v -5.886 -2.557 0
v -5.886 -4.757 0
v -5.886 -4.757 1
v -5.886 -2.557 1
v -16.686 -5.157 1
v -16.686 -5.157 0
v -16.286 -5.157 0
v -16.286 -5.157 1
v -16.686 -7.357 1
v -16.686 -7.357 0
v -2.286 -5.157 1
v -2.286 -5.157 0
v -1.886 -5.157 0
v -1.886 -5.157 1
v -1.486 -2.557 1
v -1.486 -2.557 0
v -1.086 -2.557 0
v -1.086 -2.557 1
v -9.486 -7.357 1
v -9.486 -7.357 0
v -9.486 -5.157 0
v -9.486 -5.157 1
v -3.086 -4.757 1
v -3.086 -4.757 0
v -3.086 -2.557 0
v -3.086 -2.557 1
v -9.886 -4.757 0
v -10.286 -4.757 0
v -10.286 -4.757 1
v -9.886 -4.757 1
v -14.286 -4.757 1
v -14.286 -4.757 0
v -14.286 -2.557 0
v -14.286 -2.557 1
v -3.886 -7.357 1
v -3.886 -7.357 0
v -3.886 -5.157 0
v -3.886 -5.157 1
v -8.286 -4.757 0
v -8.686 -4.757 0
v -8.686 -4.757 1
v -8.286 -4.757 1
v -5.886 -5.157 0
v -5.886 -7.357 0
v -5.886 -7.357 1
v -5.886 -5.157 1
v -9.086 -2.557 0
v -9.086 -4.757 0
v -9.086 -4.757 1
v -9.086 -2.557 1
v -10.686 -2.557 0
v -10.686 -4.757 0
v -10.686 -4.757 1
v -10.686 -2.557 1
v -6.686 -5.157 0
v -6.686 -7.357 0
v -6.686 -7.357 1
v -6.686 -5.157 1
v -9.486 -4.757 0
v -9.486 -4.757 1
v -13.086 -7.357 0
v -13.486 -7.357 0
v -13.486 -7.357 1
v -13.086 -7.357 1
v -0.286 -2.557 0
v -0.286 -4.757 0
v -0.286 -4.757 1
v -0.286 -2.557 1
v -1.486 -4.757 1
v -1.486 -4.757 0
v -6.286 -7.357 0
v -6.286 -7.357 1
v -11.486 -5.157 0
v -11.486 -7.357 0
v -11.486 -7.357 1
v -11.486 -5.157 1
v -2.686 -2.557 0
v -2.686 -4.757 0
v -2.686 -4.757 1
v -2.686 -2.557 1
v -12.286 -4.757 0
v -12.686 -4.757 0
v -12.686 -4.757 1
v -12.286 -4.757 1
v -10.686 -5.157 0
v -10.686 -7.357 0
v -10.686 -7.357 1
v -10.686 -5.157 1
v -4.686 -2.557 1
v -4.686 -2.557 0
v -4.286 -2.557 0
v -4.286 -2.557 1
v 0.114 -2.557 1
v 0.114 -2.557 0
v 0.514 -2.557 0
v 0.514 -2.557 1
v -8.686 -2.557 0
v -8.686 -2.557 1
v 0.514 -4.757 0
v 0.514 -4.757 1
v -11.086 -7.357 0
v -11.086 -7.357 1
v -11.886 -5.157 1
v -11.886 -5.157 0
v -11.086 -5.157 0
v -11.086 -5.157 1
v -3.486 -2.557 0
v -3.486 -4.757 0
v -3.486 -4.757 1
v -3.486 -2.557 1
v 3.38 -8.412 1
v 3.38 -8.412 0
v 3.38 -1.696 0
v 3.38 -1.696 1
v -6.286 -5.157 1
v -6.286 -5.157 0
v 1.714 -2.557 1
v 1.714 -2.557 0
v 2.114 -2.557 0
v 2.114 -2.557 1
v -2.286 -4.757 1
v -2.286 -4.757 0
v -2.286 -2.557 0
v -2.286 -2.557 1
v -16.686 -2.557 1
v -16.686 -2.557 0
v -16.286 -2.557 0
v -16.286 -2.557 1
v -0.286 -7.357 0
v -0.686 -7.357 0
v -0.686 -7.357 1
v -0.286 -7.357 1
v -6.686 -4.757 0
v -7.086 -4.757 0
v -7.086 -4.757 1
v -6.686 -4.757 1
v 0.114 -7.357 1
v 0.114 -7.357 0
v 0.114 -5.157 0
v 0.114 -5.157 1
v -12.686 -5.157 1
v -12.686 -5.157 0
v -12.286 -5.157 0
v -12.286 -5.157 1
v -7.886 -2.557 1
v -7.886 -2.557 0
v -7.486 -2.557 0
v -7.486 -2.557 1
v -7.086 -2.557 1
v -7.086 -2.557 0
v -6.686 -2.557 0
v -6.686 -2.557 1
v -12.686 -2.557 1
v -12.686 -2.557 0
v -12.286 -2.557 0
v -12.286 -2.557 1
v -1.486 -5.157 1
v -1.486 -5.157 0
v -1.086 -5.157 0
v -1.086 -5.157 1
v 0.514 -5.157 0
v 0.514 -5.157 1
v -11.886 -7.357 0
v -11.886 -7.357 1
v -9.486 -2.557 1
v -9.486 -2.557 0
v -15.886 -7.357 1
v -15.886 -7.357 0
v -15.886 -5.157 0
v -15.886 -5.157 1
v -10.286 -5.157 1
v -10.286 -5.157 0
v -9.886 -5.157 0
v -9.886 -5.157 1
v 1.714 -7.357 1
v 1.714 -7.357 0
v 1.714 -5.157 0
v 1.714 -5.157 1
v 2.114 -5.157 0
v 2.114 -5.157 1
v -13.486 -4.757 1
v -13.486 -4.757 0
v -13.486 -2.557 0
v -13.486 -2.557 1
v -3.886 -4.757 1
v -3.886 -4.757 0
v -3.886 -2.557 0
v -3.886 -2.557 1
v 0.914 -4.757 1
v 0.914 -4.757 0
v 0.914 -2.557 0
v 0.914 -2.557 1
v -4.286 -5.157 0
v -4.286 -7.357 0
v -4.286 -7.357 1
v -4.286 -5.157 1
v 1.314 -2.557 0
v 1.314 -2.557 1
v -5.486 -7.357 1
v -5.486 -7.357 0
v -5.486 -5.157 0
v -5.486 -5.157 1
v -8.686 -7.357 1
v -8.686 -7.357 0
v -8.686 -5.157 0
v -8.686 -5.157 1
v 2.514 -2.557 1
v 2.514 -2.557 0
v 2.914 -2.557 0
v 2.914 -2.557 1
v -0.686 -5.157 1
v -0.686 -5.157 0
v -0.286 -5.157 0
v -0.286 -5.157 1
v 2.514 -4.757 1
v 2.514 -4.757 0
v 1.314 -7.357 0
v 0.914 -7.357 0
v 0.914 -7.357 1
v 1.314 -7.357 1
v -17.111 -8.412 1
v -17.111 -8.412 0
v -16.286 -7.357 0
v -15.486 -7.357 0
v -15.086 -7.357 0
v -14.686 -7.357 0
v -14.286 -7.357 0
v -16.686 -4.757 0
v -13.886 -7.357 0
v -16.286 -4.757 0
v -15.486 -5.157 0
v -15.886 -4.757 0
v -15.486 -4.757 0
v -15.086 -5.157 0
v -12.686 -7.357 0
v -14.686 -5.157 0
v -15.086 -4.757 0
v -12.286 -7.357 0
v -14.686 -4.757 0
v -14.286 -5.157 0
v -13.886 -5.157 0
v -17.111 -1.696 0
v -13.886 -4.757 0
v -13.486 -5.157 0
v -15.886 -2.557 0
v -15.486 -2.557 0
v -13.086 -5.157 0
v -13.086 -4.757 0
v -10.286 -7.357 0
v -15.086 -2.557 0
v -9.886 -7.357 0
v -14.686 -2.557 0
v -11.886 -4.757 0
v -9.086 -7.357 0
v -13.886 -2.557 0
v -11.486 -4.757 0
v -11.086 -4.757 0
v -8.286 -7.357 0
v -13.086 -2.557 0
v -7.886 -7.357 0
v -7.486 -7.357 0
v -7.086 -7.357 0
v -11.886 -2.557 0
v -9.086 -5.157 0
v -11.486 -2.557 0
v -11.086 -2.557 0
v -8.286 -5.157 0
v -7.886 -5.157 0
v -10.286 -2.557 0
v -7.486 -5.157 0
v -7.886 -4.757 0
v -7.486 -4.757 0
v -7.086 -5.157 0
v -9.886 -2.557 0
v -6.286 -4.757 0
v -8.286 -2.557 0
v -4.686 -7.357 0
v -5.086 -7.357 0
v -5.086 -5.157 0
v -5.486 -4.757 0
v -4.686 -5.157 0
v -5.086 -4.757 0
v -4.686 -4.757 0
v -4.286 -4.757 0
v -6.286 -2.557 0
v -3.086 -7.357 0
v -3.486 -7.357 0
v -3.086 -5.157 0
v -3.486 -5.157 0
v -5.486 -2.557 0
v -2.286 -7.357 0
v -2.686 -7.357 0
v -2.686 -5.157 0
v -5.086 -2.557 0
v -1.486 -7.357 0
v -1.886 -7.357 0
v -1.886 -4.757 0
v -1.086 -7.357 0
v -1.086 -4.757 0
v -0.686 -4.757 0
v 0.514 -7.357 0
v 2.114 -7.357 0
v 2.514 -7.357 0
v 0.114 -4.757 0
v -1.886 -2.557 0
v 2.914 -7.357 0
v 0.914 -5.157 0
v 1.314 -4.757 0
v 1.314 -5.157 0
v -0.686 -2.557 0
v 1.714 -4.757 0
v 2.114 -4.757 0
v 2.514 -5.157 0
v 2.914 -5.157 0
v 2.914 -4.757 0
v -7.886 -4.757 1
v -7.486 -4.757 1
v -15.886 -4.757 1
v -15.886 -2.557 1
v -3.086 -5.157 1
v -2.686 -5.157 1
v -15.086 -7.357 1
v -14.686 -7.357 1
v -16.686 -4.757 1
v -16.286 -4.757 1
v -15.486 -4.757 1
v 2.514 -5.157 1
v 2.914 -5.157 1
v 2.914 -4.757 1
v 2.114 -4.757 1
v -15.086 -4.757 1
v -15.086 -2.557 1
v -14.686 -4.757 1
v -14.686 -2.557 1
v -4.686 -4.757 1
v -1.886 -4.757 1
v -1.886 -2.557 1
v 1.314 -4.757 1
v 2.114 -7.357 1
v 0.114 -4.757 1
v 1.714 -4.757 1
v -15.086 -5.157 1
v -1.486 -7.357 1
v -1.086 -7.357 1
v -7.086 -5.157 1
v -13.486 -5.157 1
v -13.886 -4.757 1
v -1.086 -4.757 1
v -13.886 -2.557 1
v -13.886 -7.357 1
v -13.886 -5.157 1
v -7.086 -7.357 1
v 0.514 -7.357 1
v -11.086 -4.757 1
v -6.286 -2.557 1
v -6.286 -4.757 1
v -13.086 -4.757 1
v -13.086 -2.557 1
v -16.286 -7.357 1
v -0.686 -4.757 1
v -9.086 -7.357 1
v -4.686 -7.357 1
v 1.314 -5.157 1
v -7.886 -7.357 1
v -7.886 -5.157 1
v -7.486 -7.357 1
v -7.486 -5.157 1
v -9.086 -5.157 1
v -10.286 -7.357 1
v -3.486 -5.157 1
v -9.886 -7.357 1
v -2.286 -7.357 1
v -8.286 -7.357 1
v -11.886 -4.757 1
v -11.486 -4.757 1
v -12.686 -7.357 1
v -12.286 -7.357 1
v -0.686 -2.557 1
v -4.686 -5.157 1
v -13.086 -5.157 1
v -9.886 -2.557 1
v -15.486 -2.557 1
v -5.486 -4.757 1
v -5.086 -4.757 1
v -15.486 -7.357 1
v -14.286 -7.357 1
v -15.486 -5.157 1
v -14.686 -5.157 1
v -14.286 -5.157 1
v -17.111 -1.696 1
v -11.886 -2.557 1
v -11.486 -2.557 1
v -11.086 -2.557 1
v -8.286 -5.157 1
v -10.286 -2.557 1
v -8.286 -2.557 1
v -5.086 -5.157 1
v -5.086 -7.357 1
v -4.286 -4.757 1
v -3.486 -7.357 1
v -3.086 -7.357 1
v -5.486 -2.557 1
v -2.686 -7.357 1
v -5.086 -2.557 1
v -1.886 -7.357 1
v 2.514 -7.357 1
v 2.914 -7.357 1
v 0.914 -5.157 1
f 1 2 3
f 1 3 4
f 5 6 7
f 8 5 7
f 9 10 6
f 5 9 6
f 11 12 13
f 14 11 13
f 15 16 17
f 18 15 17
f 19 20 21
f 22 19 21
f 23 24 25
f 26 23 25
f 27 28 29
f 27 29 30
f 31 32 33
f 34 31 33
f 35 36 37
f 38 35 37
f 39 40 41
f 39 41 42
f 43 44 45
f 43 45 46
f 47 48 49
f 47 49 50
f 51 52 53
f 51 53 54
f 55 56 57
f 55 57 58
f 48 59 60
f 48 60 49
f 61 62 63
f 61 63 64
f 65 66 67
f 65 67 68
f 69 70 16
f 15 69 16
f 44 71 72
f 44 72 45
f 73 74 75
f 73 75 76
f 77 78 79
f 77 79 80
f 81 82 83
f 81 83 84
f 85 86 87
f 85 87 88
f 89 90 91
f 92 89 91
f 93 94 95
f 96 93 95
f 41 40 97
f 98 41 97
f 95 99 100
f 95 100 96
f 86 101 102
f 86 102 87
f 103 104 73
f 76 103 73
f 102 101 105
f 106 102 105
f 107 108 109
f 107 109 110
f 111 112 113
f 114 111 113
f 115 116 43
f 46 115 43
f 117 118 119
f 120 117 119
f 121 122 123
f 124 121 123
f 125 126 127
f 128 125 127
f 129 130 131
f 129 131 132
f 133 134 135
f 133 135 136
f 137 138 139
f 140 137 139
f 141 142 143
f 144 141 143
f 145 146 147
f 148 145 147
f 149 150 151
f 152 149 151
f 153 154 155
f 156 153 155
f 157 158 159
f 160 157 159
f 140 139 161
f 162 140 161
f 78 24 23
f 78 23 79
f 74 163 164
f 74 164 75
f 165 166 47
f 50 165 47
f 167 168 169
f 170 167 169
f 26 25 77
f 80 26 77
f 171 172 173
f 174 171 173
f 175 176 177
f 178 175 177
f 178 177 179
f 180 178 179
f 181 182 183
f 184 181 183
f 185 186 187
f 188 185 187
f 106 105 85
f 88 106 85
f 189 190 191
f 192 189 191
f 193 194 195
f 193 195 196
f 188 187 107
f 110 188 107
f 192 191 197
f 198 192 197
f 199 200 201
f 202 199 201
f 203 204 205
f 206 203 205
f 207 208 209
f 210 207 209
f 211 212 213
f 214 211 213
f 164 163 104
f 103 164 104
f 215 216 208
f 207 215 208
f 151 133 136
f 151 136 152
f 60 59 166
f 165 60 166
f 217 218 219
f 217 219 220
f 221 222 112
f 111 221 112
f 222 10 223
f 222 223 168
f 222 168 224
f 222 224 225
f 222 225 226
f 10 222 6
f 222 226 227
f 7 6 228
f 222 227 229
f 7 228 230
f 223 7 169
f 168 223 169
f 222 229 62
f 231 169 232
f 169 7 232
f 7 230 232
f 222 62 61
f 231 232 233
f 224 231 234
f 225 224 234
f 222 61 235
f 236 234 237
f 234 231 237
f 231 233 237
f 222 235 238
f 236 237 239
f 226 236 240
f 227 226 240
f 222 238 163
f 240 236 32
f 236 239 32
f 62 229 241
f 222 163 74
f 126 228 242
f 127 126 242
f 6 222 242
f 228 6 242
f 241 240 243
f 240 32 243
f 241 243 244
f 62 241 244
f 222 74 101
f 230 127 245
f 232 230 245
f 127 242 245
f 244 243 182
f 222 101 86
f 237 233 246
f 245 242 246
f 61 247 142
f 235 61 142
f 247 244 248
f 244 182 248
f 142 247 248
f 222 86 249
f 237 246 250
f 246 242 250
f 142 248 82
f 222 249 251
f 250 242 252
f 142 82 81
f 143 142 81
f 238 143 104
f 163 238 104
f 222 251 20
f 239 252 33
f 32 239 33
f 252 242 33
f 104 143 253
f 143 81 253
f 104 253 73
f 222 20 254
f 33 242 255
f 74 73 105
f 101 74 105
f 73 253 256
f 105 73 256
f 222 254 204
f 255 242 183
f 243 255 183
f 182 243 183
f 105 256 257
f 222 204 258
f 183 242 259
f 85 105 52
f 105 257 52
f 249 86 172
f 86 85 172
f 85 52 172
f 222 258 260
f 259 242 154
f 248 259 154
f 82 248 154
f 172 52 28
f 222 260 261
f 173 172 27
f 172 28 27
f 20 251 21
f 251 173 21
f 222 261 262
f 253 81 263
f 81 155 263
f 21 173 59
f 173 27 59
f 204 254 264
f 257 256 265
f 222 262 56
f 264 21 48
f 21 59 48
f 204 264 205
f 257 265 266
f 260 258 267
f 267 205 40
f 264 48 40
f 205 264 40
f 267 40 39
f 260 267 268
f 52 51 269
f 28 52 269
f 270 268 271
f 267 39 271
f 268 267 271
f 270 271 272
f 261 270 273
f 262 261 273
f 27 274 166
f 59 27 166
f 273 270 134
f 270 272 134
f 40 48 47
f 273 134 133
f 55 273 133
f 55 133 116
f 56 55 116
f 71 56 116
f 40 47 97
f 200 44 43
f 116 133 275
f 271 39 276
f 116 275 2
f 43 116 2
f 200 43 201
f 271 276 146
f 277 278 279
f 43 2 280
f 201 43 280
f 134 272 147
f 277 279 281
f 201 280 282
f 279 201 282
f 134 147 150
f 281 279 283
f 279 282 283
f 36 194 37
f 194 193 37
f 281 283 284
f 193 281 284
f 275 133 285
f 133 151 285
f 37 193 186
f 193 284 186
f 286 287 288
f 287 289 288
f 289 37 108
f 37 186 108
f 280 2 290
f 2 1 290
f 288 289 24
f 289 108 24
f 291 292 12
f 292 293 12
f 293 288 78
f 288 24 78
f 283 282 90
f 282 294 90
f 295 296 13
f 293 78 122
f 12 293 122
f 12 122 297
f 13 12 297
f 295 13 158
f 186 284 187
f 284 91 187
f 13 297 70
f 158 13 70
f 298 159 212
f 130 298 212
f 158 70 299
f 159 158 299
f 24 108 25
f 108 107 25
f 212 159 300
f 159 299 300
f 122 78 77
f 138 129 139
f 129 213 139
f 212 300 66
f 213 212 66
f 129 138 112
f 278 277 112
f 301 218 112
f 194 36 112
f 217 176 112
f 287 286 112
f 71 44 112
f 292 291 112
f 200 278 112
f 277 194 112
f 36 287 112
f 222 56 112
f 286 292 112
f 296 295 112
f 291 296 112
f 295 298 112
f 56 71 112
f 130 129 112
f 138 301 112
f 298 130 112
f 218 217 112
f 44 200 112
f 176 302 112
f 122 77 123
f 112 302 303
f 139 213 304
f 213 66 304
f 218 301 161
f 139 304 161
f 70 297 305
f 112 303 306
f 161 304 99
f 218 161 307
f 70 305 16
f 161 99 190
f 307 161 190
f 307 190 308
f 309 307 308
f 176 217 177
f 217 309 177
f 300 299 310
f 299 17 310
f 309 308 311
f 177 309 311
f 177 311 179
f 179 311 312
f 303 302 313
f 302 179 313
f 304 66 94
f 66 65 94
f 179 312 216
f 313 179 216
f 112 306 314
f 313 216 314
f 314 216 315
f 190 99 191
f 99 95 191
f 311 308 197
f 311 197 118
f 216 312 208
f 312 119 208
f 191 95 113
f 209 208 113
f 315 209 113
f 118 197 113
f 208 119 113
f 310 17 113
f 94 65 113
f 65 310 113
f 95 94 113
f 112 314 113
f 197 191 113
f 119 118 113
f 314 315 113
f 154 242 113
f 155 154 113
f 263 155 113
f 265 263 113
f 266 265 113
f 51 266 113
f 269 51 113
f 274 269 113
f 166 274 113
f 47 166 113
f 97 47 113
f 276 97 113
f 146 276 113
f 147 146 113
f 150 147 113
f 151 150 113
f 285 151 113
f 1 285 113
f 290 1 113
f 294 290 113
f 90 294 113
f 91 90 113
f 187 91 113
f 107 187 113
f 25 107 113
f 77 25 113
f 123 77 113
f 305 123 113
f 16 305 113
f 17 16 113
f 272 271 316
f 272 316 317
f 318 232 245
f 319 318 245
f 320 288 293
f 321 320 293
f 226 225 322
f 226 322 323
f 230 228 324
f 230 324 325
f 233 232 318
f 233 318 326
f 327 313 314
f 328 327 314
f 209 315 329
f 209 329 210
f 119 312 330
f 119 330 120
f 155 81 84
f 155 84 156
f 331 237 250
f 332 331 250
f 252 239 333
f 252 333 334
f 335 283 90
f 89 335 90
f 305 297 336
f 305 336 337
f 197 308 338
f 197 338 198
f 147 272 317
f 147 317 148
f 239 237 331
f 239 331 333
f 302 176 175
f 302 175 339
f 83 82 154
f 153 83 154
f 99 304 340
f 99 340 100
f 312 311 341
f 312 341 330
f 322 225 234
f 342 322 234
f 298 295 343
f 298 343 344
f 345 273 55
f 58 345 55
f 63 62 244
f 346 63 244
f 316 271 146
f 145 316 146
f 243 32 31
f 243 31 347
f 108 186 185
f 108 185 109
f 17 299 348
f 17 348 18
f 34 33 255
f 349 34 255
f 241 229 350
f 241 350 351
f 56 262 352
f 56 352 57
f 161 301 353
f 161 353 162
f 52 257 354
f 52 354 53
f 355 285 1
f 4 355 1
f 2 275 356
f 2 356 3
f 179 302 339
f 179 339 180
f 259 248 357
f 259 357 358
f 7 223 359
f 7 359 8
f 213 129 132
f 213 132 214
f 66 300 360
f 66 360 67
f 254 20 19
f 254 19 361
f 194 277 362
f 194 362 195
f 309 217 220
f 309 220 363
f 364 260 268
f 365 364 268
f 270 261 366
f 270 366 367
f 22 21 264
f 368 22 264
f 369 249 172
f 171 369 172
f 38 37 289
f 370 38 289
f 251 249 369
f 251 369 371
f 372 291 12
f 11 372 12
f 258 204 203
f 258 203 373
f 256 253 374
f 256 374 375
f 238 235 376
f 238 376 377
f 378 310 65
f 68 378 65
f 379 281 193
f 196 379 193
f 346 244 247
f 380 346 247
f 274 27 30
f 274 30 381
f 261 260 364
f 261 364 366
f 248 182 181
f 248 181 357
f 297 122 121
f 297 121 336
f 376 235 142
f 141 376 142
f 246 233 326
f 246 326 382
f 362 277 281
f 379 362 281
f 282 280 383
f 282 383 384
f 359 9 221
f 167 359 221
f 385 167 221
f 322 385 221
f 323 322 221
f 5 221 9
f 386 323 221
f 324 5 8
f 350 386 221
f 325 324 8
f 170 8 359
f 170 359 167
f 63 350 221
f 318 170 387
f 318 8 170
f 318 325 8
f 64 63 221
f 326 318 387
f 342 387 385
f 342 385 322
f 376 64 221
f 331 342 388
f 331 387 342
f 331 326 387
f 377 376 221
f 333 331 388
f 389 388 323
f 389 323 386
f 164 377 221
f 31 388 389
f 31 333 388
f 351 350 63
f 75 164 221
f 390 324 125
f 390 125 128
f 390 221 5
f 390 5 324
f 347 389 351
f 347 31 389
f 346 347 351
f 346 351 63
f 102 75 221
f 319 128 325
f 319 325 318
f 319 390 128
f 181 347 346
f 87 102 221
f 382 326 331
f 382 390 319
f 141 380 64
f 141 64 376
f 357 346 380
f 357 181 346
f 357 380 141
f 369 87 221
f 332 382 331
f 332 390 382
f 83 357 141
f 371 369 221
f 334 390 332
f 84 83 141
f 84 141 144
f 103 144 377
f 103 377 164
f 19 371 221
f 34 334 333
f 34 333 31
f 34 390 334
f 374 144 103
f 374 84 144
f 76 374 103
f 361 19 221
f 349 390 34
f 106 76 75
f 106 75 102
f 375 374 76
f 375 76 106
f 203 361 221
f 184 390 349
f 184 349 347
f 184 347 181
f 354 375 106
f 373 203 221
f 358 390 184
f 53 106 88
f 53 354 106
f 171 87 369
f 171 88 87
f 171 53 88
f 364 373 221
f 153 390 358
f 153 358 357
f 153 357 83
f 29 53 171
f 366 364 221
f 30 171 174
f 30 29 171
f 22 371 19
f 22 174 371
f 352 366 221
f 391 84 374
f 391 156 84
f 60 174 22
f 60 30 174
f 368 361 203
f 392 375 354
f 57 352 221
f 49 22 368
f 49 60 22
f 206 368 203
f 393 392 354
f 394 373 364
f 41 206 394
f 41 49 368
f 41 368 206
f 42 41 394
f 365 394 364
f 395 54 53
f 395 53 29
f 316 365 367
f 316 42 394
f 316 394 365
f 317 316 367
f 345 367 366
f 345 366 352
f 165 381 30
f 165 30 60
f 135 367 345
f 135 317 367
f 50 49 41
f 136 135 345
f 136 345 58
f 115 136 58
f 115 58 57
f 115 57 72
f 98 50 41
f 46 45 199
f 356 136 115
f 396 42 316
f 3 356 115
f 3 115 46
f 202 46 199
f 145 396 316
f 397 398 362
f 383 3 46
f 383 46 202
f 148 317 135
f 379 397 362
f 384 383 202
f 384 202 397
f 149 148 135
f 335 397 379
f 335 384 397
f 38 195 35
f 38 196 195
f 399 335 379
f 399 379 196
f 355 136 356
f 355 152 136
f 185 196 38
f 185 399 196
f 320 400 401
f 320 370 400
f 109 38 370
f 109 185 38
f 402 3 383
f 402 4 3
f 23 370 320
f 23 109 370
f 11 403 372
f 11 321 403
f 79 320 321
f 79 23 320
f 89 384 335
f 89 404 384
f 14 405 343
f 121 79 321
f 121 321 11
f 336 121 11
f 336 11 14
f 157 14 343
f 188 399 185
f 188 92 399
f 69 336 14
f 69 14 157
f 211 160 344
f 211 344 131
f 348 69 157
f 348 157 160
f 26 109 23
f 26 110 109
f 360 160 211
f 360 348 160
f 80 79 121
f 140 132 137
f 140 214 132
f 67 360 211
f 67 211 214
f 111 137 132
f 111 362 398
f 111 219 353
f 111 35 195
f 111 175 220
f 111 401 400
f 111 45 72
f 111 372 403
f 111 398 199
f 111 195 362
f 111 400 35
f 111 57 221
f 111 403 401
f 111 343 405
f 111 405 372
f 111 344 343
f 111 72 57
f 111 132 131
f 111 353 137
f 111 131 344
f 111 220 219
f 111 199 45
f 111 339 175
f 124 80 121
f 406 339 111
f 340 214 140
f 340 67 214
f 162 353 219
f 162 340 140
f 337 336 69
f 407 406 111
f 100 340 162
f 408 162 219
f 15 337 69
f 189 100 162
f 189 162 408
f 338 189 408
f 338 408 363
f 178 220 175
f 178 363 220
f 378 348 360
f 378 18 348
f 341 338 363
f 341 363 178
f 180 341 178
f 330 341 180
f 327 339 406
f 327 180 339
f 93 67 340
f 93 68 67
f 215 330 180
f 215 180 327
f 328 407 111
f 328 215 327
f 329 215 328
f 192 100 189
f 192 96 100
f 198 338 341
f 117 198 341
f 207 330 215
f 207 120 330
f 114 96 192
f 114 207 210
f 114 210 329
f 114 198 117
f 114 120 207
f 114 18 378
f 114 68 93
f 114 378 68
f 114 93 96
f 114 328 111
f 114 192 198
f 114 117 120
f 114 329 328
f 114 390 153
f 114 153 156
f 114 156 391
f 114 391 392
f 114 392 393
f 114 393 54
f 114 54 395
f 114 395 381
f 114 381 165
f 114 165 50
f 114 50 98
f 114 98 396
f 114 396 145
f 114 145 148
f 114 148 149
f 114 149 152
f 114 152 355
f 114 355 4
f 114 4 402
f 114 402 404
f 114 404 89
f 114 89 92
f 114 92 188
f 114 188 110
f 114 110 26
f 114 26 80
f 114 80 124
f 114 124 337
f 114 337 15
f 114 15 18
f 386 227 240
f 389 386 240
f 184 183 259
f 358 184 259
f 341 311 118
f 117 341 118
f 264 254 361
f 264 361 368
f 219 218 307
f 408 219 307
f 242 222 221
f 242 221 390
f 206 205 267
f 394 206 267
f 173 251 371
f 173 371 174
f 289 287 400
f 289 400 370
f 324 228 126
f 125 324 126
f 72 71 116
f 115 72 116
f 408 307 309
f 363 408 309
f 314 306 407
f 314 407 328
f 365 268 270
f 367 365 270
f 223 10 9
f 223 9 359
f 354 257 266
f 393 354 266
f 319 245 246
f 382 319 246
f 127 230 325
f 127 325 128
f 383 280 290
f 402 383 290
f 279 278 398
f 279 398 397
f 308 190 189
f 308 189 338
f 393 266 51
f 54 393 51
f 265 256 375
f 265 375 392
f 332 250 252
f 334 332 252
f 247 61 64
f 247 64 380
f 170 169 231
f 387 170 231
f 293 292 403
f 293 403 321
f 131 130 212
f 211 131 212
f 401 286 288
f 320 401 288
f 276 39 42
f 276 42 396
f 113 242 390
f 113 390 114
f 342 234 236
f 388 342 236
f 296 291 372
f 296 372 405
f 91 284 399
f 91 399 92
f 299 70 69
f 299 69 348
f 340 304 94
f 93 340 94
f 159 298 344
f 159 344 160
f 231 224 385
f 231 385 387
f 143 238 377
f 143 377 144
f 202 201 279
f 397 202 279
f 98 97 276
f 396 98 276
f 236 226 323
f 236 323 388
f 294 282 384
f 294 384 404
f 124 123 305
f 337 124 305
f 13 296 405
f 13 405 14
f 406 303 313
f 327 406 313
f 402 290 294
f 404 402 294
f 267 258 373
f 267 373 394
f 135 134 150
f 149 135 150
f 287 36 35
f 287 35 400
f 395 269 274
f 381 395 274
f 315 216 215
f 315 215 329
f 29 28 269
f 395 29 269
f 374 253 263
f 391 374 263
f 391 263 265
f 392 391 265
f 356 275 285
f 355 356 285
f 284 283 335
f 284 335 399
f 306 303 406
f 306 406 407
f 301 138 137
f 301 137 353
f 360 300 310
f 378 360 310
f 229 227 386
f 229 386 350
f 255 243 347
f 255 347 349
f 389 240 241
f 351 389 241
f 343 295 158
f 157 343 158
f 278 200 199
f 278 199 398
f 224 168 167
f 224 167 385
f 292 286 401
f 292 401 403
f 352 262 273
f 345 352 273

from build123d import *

# Parameters (mm, degrees)
F1_W     = 20.491264
F1_H     = 6.716872
F1_W_2   = 0.4
F1_H_2   = 2.2
F2_DEPTH = 1


with BuildPart() as f2:
    # F1 (on face) → F2 (new body)
    with BuildSketch(Plane.XY):
        with Locations((-6.865435, -5.054062)):
            Rectangle(F1_W, F1_H)
        with Locations((-16.485979, -6.256568)):
            Rectangle(F1_W_2, F1_H_2, mode=Mode.SUBTRACT)
        with Locations((-15.685979, -6.256568)):
            Rectangle(F1_W_2, F1_H_2, mode=Mode.SUBTRACT)
        with Locations((-14.885979, -6.256568)):
            Rectangle(F1_W_2, F1_H_2, mode=Mode.SUBTRACT)
        with Locations((-14.085979, -6.256568)):
            Rectangle(F1_W_2, F1_H_2, mode=Mode.SUBTRACT)
        with Locations((-13.285979, -6.256568)):
            Rectangle(F1_W_2, F1_H_2, mode=Mode.SUBTRACT)
        with Locations((-12.485979, -6.256568)):
            Rectangle(F1_W_2, F1_H_2, mode=Mode.SUBTRACT)
        with Locations((-11.685979, -6.256568)):
            Rectangle(F1_W_2, F1_H_2, mode=Mode.SUBTRACT)
        with Locations((-10.885979, -6.256568)):
            Rectangle(F1_W_2, F1_H_2, mode=Mode.SUBTRACT)
        with Locations((-10.085979, -6.256568)):
            Rectangle(F1_W_2, F1_H_2, mode=Mode.SUBTRACT)
        with Locations((-9.285979, -6.256568)):
            Rectangle(F1_W_2, F1_H_2, mode=Mode.SUBTRACT)
        with Locations((-8.485979, -6.256568)):
            Rectangle(F1_W_2, F1_H_2, mode=Mode.SUBTRACT)
        with Locations((-7.685979, -6.256568)):
            Rectangle(F1_W_2, F1_H_2, mode=Mode.SUBTRACT)
        with Locations((-6.885979, -6.256568)):
            Rectangle(F1_W_2, F1_H_2, mode=Mode.SUBTRACT)
        with Locations((-16.485979, -3.656568)):
            Rectangle(F1_W_2, F1_H_2, mode=Mode.SUBTRACT)
        with Locations((-15.685979, -3.656568)):
            Rectangle(F1_W_2, F1_H_2, mode=Mode.SUBTRACT)
        with Locations((-14.885979, -3.656568)):
            Rectangle(F1_W_2, F1_H_2, mode=Mode.SUBTRACT)
        with Locations((-14.085979, -3.656568)):
            Rectangle(F1_W_2, F1_H_2, mode=Mode.SUBTRACT)
        with Locations((-13.285979, -3.656568)):
            Rectangle(F1_W_2, F1_H_2, mode=Mode.SUBTRACT)
        with Locations((-12.485979, -3.656568)):
            Rectangle(F1_W_2, F1_H_2, mode=Mode.SUBTRACT)
        with Locations((-11.685979, -3.656568)):
            Rectangle(F1_W_2, F1_H_2, mode=Mode.SUBTRACT)
        with Locations((-10.885979, -3.656568)):
            Rectangle(F1_W_2, F1_H_2, mode=Mode.SUBTRACT)
        with Locations((-10.085979, -3.656568)):
            Rectangle(F1_W_2, F1_H_2, mode=Mode.SUBTRACT)
        with Locations((-9.285979, -3.656568)):
            Rectangle(F1_W_2, F1_H_2, mode=Mode.SUBTRACT)
        with Locations((-8.485979, -3.656568)):
            Rectangle(F1_W_2, F1_H_2, mode=Mode.SUBTRACT)
        with Locations((-7.685979, -3.656568)):
            Rectangle(F1_W_2, F1_H_2, mode=Mode.SUBTRACT)
        with Locations((-6.885979, -3.656568)):
            Rectangle(F1_W_2, F1_H_2, mode=Mode.SUBTRACT)
        with Locations((-6.085979, -6.256568)):
            Rectangle(F1_W_2, F1_H_2, mode=Mode.SUBTRACT)
        with Locations((-5.285979, -6.256568)):
            Rectangle(F1_W_2, F1_H_2, mode=Mode.SUBTRACT)
        with Locations((-4.485979, -6.256568)):
            Rectangle(F1_W_2, F1_H_2, mode=Mode.SUBTRACT)
        with Locations((-3.685979, -6.256568)):
            Rectangle(F1_W_2, F1_H_2, mode=Mode.SUBTRACT)
        with Locations((-2.885979, -6.256568)):
            Rectangle(F1_W_2, F1_H_2, mode=Mode.SUBTRACT)
        with Locations((-2.085979, -6.256568)):
            Rectangle(F1_W_2, F1_H_2, mode=Mode.SUBTRACT)
        with Locations((-1.285979, -6.256568)):
            Rectangle(F1_W_2, F1_H_2, mode=Mode.SUBTRACT)
        with Locations((-0.485979, -6.256568)):
            Rectangle(F1_W_2, F1_H_2, mode=Mode.SUBTRACT)
        with Locations((0.314021, -6.256568)):
            Rectangle(F1_W_2, F1_H_2, mode=Mode.SUBTRACT)
        with Locations((1.114021, -6.256568)):
            Rectangle(F1_W_2, F1_H_2, mode=Mode.SUBTRACT)
        with Locations((1.914021, -6.256568)):
            Rectangle(F1_W_2, F1_H_2, mode=Mode.SUBTRACT)
        with Locations((2.714021, -6.256568)):
            Rectangle(F1_W_2, F1_H_2, mode=Mode.SUBTRACT)
        with Locations((-6.085979, -3.656568)):
            Rectangle(F1_W_2, F1_H_2, mode=Mode.SUBTRACT)
        with Locations((-5.285979, -3.656568)):
            Rectangle(F1_W_2, F1_H_2, mode=Mode.SUBTRACT)
        with Locations((-4.485979, -3.656568)):
            Rectangle(F1_W_2, F1_H_2, mode=Mode.SUBTRACT)
        with Locations((-3.685979, -3.656568)):
            Rectangle(F1_W_2, F1_H_2, mode=Mode.SUBTRACT)
        with Locations((-2.885979, -3.656568)):
            Rectangle(F1_W_2, F1_H_2, mode=Mode.SUBTRACT)
        with Locations((-2.085979, -3.656568)):
            Rectangle(F1_W_2, F1_H_2, mode=Mode.SUBTRACT)
        with Locations((-1.285979, -3.656568)):
            Rectangle(F1_W_2, F1_H_2, mode=Mode.SUBTRACT)
        with Locations((-0.485979, -3.656568)):
            Rectangle(F1_W_2, F1_H_2, mode=Mode.SUBTRACT)
        with Locations((0.314021, -3.656568)):
            Rectangle(F1_W_2, F1_H_2, mode=Mode.SUBTRACT)
        with Locations((1.114021, -3.656568)):
            Rectangle(F1_W_2, F1_H_2, mode=Mode.SUBTRACT)
        with Locations((1.914021, -3.656568)):
            Rectangle(F1_W_2, F1_H_2, mode=Mode.SUBTRACT)
        with Locations((2.714021, -3.656568)):
            Rectangle(F1_W_2, F1_H_2, mode=Mode.SUBTRACT)
    extrude(amount=F2_DEPTH)


solid = f2.part
